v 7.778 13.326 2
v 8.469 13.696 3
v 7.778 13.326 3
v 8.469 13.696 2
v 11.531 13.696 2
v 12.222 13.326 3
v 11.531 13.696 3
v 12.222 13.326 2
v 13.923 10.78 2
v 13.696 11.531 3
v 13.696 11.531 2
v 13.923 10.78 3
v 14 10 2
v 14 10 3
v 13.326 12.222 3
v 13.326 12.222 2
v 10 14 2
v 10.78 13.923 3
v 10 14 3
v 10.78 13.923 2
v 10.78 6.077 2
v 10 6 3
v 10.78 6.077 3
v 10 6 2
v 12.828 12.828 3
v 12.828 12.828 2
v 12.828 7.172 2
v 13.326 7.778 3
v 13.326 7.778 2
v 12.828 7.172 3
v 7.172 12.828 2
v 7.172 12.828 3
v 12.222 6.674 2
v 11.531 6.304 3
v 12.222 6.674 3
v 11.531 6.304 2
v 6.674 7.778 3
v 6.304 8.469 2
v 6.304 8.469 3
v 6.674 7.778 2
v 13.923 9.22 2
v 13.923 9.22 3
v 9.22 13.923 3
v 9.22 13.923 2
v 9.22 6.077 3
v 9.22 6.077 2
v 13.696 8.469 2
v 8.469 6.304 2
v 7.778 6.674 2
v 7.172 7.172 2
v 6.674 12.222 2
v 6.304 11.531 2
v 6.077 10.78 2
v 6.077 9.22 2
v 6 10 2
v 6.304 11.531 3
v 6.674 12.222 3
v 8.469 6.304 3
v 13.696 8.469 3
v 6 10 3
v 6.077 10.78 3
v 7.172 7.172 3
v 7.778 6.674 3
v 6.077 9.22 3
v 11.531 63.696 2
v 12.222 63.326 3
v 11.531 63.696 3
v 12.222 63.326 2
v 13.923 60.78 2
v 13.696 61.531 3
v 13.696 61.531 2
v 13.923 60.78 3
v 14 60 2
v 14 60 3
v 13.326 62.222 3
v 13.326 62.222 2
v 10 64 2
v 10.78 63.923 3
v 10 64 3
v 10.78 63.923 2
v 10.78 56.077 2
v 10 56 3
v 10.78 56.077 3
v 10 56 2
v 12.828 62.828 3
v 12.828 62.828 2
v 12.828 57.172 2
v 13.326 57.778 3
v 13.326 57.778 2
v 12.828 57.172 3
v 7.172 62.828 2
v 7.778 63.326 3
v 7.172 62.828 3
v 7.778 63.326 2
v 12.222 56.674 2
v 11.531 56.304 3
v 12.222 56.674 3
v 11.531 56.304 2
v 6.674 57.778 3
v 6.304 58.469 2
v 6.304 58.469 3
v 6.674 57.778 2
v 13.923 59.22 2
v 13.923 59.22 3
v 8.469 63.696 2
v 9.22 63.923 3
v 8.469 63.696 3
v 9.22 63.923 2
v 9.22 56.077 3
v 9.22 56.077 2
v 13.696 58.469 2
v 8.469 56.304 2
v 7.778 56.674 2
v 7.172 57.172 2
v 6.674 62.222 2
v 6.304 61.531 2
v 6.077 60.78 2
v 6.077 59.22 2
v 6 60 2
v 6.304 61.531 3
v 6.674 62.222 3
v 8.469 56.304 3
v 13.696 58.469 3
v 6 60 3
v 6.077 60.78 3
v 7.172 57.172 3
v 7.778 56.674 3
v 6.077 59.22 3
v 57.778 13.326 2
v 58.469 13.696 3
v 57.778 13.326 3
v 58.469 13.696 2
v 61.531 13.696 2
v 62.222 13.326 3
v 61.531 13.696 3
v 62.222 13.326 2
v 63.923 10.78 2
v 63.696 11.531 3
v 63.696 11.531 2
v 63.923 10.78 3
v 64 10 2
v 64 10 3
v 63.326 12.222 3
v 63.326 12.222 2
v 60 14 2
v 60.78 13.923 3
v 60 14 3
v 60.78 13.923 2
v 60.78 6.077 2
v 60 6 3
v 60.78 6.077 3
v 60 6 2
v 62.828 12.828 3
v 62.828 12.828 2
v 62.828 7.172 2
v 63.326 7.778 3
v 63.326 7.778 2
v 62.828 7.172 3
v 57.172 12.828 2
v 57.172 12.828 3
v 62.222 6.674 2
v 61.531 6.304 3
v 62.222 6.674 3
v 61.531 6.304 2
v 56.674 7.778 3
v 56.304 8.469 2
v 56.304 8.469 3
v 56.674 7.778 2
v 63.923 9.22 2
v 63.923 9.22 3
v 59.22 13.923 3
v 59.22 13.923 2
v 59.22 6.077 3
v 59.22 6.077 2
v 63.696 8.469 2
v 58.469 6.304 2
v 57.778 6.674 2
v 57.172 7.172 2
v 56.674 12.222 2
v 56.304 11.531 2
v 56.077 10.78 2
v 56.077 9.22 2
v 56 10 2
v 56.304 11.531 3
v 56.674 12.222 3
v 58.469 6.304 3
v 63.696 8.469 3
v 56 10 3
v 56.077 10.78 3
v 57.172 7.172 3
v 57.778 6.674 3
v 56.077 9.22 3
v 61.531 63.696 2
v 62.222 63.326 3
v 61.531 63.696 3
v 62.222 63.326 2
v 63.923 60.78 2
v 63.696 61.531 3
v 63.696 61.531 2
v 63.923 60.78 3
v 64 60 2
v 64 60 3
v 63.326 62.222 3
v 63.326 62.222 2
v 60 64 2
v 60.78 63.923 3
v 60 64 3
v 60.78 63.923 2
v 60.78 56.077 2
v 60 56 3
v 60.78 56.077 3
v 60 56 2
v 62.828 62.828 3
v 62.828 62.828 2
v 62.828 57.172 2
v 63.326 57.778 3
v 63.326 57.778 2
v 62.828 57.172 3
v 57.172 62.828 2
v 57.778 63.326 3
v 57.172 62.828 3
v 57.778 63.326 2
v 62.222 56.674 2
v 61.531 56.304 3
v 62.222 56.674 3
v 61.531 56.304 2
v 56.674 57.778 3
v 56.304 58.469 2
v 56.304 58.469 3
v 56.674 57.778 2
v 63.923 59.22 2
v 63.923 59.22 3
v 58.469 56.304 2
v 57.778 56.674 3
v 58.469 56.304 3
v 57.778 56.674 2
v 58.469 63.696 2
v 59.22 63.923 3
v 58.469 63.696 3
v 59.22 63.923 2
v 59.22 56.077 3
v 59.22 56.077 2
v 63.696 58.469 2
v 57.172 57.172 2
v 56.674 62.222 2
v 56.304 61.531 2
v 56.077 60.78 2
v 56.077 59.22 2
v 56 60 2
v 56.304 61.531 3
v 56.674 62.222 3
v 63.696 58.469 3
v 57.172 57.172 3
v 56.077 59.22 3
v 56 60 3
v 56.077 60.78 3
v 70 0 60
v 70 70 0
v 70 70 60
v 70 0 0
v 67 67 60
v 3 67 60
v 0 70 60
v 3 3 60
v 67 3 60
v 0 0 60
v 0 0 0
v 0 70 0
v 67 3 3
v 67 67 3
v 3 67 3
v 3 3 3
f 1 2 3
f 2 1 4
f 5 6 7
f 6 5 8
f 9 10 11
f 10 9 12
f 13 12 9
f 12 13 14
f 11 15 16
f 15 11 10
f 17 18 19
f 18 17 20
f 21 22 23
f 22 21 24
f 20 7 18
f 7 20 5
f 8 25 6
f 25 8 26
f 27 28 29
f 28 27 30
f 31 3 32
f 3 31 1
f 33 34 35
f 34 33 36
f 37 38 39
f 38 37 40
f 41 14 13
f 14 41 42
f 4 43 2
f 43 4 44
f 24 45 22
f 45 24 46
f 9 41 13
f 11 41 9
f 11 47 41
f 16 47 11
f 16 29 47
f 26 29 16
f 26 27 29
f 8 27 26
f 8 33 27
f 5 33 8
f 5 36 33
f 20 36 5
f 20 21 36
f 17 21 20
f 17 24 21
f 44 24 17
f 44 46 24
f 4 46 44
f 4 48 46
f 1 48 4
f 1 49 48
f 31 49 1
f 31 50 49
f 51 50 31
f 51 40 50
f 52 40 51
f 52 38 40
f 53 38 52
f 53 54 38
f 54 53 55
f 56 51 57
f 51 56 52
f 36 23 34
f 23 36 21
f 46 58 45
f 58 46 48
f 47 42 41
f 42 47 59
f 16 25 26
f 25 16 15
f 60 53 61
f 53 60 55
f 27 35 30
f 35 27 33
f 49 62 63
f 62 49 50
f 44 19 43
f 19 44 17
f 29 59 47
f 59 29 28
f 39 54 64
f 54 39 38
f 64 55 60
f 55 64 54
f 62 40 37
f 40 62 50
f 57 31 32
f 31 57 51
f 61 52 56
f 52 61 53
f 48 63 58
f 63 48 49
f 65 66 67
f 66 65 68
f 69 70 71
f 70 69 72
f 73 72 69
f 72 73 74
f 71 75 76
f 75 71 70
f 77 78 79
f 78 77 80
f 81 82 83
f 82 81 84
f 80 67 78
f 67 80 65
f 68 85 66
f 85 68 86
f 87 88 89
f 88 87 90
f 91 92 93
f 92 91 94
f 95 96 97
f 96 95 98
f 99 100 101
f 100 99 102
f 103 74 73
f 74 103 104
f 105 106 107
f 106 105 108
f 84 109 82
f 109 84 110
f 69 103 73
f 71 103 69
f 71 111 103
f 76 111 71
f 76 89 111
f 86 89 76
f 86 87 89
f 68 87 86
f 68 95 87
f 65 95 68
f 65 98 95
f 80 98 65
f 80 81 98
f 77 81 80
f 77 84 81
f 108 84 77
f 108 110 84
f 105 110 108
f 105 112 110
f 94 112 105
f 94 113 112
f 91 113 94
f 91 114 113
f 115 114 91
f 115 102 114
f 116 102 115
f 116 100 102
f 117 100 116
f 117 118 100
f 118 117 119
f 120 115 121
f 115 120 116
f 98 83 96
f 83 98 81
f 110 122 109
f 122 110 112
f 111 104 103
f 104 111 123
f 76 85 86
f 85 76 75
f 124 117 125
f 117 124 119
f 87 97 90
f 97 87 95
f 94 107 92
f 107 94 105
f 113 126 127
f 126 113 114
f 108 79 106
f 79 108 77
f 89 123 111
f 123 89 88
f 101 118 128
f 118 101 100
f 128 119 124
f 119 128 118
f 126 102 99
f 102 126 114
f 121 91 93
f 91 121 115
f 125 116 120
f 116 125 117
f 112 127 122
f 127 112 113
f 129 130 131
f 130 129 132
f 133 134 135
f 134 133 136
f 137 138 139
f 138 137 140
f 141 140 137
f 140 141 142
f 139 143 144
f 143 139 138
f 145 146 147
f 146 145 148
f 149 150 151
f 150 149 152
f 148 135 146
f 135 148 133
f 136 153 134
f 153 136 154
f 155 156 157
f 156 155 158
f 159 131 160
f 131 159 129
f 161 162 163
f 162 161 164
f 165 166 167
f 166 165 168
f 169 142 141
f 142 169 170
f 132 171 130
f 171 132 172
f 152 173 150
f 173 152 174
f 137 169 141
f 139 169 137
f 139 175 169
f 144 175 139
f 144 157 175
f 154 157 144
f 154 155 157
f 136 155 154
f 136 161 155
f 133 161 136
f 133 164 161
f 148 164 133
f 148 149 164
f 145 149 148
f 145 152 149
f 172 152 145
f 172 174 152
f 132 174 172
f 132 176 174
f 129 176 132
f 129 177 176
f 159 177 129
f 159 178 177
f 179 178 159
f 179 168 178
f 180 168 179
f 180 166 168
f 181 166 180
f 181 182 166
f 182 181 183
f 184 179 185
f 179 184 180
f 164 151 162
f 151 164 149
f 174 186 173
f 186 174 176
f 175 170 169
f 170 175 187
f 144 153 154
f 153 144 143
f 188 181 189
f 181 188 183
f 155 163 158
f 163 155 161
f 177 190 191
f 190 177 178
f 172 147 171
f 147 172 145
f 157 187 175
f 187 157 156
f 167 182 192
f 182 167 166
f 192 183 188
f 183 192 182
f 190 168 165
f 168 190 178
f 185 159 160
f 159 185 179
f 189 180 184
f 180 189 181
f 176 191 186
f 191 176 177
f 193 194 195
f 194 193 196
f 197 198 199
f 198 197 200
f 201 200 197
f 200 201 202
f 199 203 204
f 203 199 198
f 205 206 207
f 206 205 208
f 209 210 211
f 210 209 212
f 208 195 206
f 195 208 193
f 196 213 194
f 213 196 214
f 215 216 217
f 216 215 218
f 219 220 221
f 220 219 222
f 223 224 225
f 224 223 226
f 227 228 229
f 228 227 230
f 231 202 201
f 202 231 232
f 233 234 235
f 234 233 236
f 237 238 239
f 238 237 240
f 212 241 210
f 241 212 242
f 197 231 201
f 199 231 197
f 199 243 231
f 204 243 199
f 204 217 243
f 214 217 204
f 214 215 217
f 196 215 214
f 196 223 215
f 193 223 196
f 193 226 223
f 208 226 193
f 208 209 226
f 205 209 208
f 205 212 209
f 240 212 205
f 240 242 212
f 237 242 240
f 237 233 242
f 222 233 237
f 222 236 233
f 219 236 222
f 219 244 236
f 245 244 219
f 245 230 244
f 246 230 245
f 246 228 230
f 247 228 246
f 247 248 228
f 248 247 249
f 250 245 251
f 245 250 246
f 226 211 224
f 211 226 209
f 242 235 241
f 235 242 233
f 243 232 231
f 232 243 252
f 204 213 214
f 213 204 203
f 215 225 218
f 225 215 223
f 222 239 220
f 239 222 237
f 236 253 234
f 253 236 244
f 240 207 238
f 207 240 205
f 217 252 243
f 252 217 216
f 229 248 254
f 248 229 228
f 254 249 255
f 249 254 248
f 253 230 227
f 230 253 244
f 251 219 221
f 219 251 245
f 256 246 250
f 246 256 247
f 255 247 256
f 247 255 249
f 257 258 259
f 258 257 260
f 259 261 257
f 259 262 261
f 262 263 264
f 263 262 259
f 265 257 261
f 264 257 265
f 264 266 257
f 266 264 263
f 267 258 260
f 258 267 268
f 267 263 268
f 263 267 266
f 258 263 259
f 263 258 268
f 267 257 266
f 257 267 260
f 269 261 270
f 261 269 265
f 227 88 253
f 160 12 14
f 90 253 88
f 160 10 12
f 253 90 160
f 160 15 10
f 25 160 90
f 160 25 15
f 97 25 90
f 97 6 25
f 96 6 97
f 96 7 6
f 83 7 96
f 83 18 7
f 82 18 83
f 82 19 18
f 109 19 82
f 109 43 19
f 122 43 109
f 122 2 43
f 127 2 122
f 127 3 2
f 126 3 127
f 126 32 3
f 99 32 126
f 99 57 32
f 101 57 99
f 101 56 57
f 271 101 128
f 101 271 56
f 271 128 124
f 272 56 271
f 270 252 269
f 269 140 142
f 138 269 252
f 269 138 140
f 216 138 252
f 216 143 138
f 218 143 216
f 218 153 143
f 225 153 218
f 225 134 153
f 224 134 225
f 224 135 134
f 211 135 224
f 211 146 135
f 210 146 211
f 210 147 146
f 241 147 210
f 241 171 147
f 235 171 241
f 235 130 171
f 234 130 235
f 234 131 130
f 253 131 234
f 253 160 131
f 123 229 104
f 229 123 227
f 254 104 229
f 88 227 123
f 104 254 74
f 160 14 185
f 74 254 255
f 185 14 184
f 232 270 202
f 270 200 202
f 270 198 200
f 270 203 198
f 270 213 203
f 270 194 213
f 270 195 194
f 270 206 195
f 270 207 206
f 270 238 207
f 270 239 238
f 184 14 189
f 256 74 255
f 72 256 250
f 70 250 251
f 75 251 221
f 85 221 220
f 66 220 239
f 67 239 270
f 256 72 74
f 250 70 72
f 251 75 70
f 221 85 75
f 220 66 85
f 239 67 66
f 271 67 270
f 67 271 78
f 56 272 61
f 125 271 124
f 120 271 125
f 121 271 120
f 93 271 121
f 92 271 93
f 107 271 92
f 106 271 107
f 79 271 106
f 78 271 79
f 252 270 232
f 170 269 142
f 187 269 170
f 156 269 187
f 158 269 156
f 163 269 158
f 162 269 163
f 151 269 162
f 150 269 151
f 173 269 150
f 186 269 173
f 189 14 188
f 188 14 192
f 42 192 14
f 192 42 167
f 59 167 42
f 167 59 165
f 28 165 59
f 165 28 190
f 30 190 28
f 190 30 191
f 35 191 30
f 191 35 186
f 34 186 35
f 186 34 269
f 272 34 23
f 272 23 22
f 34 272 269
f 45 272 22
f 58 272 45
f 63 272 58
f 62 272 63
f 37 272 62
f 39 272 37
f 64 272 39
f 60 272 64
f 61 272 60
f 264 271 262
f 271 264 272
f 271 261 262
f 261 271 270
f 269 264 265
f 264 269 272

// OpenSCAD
$fn = 32;

// ----------------------------------------------------------------------
// Enclosure box: bosses enclosure
// ----------------------------------------------------------------------

// --- parameters (mm) ---
box_l = 70;               // outer length, X
box_w = 70;               // outer width, Y
box_h = 60;               // outer height
wall_t = 3;               // wall thickness
boss_r = 4;               // corner boss radius
hole_r = 2;               // boss screw hole radius
boss_in = 10;             // boss inset from the corners

inner_h = box_h - wall_t;  // cavity depth
boss_h = inner_h - 2;  // corner boss height

difference() {
  cube([box_l, box_w, box_h]);
  translate([wall_t, wall_t, wall_t])
    cube([box_l - 2 * wall_t, box_w - 2 * wall_t, box_h]);
  for (sx = [0, 1], sy = [0, 1])
    translate([sx ? box_l - boss_in : boss_in,
               sy ? box_w - boss_in : boss_in, wall_t - 1]) {
      cylinder(r = boss_r, h = boss_h);
      translate([0, 0, boss_h - 4])
        cylinder(r = hole_r, h = 5);
    }
}
